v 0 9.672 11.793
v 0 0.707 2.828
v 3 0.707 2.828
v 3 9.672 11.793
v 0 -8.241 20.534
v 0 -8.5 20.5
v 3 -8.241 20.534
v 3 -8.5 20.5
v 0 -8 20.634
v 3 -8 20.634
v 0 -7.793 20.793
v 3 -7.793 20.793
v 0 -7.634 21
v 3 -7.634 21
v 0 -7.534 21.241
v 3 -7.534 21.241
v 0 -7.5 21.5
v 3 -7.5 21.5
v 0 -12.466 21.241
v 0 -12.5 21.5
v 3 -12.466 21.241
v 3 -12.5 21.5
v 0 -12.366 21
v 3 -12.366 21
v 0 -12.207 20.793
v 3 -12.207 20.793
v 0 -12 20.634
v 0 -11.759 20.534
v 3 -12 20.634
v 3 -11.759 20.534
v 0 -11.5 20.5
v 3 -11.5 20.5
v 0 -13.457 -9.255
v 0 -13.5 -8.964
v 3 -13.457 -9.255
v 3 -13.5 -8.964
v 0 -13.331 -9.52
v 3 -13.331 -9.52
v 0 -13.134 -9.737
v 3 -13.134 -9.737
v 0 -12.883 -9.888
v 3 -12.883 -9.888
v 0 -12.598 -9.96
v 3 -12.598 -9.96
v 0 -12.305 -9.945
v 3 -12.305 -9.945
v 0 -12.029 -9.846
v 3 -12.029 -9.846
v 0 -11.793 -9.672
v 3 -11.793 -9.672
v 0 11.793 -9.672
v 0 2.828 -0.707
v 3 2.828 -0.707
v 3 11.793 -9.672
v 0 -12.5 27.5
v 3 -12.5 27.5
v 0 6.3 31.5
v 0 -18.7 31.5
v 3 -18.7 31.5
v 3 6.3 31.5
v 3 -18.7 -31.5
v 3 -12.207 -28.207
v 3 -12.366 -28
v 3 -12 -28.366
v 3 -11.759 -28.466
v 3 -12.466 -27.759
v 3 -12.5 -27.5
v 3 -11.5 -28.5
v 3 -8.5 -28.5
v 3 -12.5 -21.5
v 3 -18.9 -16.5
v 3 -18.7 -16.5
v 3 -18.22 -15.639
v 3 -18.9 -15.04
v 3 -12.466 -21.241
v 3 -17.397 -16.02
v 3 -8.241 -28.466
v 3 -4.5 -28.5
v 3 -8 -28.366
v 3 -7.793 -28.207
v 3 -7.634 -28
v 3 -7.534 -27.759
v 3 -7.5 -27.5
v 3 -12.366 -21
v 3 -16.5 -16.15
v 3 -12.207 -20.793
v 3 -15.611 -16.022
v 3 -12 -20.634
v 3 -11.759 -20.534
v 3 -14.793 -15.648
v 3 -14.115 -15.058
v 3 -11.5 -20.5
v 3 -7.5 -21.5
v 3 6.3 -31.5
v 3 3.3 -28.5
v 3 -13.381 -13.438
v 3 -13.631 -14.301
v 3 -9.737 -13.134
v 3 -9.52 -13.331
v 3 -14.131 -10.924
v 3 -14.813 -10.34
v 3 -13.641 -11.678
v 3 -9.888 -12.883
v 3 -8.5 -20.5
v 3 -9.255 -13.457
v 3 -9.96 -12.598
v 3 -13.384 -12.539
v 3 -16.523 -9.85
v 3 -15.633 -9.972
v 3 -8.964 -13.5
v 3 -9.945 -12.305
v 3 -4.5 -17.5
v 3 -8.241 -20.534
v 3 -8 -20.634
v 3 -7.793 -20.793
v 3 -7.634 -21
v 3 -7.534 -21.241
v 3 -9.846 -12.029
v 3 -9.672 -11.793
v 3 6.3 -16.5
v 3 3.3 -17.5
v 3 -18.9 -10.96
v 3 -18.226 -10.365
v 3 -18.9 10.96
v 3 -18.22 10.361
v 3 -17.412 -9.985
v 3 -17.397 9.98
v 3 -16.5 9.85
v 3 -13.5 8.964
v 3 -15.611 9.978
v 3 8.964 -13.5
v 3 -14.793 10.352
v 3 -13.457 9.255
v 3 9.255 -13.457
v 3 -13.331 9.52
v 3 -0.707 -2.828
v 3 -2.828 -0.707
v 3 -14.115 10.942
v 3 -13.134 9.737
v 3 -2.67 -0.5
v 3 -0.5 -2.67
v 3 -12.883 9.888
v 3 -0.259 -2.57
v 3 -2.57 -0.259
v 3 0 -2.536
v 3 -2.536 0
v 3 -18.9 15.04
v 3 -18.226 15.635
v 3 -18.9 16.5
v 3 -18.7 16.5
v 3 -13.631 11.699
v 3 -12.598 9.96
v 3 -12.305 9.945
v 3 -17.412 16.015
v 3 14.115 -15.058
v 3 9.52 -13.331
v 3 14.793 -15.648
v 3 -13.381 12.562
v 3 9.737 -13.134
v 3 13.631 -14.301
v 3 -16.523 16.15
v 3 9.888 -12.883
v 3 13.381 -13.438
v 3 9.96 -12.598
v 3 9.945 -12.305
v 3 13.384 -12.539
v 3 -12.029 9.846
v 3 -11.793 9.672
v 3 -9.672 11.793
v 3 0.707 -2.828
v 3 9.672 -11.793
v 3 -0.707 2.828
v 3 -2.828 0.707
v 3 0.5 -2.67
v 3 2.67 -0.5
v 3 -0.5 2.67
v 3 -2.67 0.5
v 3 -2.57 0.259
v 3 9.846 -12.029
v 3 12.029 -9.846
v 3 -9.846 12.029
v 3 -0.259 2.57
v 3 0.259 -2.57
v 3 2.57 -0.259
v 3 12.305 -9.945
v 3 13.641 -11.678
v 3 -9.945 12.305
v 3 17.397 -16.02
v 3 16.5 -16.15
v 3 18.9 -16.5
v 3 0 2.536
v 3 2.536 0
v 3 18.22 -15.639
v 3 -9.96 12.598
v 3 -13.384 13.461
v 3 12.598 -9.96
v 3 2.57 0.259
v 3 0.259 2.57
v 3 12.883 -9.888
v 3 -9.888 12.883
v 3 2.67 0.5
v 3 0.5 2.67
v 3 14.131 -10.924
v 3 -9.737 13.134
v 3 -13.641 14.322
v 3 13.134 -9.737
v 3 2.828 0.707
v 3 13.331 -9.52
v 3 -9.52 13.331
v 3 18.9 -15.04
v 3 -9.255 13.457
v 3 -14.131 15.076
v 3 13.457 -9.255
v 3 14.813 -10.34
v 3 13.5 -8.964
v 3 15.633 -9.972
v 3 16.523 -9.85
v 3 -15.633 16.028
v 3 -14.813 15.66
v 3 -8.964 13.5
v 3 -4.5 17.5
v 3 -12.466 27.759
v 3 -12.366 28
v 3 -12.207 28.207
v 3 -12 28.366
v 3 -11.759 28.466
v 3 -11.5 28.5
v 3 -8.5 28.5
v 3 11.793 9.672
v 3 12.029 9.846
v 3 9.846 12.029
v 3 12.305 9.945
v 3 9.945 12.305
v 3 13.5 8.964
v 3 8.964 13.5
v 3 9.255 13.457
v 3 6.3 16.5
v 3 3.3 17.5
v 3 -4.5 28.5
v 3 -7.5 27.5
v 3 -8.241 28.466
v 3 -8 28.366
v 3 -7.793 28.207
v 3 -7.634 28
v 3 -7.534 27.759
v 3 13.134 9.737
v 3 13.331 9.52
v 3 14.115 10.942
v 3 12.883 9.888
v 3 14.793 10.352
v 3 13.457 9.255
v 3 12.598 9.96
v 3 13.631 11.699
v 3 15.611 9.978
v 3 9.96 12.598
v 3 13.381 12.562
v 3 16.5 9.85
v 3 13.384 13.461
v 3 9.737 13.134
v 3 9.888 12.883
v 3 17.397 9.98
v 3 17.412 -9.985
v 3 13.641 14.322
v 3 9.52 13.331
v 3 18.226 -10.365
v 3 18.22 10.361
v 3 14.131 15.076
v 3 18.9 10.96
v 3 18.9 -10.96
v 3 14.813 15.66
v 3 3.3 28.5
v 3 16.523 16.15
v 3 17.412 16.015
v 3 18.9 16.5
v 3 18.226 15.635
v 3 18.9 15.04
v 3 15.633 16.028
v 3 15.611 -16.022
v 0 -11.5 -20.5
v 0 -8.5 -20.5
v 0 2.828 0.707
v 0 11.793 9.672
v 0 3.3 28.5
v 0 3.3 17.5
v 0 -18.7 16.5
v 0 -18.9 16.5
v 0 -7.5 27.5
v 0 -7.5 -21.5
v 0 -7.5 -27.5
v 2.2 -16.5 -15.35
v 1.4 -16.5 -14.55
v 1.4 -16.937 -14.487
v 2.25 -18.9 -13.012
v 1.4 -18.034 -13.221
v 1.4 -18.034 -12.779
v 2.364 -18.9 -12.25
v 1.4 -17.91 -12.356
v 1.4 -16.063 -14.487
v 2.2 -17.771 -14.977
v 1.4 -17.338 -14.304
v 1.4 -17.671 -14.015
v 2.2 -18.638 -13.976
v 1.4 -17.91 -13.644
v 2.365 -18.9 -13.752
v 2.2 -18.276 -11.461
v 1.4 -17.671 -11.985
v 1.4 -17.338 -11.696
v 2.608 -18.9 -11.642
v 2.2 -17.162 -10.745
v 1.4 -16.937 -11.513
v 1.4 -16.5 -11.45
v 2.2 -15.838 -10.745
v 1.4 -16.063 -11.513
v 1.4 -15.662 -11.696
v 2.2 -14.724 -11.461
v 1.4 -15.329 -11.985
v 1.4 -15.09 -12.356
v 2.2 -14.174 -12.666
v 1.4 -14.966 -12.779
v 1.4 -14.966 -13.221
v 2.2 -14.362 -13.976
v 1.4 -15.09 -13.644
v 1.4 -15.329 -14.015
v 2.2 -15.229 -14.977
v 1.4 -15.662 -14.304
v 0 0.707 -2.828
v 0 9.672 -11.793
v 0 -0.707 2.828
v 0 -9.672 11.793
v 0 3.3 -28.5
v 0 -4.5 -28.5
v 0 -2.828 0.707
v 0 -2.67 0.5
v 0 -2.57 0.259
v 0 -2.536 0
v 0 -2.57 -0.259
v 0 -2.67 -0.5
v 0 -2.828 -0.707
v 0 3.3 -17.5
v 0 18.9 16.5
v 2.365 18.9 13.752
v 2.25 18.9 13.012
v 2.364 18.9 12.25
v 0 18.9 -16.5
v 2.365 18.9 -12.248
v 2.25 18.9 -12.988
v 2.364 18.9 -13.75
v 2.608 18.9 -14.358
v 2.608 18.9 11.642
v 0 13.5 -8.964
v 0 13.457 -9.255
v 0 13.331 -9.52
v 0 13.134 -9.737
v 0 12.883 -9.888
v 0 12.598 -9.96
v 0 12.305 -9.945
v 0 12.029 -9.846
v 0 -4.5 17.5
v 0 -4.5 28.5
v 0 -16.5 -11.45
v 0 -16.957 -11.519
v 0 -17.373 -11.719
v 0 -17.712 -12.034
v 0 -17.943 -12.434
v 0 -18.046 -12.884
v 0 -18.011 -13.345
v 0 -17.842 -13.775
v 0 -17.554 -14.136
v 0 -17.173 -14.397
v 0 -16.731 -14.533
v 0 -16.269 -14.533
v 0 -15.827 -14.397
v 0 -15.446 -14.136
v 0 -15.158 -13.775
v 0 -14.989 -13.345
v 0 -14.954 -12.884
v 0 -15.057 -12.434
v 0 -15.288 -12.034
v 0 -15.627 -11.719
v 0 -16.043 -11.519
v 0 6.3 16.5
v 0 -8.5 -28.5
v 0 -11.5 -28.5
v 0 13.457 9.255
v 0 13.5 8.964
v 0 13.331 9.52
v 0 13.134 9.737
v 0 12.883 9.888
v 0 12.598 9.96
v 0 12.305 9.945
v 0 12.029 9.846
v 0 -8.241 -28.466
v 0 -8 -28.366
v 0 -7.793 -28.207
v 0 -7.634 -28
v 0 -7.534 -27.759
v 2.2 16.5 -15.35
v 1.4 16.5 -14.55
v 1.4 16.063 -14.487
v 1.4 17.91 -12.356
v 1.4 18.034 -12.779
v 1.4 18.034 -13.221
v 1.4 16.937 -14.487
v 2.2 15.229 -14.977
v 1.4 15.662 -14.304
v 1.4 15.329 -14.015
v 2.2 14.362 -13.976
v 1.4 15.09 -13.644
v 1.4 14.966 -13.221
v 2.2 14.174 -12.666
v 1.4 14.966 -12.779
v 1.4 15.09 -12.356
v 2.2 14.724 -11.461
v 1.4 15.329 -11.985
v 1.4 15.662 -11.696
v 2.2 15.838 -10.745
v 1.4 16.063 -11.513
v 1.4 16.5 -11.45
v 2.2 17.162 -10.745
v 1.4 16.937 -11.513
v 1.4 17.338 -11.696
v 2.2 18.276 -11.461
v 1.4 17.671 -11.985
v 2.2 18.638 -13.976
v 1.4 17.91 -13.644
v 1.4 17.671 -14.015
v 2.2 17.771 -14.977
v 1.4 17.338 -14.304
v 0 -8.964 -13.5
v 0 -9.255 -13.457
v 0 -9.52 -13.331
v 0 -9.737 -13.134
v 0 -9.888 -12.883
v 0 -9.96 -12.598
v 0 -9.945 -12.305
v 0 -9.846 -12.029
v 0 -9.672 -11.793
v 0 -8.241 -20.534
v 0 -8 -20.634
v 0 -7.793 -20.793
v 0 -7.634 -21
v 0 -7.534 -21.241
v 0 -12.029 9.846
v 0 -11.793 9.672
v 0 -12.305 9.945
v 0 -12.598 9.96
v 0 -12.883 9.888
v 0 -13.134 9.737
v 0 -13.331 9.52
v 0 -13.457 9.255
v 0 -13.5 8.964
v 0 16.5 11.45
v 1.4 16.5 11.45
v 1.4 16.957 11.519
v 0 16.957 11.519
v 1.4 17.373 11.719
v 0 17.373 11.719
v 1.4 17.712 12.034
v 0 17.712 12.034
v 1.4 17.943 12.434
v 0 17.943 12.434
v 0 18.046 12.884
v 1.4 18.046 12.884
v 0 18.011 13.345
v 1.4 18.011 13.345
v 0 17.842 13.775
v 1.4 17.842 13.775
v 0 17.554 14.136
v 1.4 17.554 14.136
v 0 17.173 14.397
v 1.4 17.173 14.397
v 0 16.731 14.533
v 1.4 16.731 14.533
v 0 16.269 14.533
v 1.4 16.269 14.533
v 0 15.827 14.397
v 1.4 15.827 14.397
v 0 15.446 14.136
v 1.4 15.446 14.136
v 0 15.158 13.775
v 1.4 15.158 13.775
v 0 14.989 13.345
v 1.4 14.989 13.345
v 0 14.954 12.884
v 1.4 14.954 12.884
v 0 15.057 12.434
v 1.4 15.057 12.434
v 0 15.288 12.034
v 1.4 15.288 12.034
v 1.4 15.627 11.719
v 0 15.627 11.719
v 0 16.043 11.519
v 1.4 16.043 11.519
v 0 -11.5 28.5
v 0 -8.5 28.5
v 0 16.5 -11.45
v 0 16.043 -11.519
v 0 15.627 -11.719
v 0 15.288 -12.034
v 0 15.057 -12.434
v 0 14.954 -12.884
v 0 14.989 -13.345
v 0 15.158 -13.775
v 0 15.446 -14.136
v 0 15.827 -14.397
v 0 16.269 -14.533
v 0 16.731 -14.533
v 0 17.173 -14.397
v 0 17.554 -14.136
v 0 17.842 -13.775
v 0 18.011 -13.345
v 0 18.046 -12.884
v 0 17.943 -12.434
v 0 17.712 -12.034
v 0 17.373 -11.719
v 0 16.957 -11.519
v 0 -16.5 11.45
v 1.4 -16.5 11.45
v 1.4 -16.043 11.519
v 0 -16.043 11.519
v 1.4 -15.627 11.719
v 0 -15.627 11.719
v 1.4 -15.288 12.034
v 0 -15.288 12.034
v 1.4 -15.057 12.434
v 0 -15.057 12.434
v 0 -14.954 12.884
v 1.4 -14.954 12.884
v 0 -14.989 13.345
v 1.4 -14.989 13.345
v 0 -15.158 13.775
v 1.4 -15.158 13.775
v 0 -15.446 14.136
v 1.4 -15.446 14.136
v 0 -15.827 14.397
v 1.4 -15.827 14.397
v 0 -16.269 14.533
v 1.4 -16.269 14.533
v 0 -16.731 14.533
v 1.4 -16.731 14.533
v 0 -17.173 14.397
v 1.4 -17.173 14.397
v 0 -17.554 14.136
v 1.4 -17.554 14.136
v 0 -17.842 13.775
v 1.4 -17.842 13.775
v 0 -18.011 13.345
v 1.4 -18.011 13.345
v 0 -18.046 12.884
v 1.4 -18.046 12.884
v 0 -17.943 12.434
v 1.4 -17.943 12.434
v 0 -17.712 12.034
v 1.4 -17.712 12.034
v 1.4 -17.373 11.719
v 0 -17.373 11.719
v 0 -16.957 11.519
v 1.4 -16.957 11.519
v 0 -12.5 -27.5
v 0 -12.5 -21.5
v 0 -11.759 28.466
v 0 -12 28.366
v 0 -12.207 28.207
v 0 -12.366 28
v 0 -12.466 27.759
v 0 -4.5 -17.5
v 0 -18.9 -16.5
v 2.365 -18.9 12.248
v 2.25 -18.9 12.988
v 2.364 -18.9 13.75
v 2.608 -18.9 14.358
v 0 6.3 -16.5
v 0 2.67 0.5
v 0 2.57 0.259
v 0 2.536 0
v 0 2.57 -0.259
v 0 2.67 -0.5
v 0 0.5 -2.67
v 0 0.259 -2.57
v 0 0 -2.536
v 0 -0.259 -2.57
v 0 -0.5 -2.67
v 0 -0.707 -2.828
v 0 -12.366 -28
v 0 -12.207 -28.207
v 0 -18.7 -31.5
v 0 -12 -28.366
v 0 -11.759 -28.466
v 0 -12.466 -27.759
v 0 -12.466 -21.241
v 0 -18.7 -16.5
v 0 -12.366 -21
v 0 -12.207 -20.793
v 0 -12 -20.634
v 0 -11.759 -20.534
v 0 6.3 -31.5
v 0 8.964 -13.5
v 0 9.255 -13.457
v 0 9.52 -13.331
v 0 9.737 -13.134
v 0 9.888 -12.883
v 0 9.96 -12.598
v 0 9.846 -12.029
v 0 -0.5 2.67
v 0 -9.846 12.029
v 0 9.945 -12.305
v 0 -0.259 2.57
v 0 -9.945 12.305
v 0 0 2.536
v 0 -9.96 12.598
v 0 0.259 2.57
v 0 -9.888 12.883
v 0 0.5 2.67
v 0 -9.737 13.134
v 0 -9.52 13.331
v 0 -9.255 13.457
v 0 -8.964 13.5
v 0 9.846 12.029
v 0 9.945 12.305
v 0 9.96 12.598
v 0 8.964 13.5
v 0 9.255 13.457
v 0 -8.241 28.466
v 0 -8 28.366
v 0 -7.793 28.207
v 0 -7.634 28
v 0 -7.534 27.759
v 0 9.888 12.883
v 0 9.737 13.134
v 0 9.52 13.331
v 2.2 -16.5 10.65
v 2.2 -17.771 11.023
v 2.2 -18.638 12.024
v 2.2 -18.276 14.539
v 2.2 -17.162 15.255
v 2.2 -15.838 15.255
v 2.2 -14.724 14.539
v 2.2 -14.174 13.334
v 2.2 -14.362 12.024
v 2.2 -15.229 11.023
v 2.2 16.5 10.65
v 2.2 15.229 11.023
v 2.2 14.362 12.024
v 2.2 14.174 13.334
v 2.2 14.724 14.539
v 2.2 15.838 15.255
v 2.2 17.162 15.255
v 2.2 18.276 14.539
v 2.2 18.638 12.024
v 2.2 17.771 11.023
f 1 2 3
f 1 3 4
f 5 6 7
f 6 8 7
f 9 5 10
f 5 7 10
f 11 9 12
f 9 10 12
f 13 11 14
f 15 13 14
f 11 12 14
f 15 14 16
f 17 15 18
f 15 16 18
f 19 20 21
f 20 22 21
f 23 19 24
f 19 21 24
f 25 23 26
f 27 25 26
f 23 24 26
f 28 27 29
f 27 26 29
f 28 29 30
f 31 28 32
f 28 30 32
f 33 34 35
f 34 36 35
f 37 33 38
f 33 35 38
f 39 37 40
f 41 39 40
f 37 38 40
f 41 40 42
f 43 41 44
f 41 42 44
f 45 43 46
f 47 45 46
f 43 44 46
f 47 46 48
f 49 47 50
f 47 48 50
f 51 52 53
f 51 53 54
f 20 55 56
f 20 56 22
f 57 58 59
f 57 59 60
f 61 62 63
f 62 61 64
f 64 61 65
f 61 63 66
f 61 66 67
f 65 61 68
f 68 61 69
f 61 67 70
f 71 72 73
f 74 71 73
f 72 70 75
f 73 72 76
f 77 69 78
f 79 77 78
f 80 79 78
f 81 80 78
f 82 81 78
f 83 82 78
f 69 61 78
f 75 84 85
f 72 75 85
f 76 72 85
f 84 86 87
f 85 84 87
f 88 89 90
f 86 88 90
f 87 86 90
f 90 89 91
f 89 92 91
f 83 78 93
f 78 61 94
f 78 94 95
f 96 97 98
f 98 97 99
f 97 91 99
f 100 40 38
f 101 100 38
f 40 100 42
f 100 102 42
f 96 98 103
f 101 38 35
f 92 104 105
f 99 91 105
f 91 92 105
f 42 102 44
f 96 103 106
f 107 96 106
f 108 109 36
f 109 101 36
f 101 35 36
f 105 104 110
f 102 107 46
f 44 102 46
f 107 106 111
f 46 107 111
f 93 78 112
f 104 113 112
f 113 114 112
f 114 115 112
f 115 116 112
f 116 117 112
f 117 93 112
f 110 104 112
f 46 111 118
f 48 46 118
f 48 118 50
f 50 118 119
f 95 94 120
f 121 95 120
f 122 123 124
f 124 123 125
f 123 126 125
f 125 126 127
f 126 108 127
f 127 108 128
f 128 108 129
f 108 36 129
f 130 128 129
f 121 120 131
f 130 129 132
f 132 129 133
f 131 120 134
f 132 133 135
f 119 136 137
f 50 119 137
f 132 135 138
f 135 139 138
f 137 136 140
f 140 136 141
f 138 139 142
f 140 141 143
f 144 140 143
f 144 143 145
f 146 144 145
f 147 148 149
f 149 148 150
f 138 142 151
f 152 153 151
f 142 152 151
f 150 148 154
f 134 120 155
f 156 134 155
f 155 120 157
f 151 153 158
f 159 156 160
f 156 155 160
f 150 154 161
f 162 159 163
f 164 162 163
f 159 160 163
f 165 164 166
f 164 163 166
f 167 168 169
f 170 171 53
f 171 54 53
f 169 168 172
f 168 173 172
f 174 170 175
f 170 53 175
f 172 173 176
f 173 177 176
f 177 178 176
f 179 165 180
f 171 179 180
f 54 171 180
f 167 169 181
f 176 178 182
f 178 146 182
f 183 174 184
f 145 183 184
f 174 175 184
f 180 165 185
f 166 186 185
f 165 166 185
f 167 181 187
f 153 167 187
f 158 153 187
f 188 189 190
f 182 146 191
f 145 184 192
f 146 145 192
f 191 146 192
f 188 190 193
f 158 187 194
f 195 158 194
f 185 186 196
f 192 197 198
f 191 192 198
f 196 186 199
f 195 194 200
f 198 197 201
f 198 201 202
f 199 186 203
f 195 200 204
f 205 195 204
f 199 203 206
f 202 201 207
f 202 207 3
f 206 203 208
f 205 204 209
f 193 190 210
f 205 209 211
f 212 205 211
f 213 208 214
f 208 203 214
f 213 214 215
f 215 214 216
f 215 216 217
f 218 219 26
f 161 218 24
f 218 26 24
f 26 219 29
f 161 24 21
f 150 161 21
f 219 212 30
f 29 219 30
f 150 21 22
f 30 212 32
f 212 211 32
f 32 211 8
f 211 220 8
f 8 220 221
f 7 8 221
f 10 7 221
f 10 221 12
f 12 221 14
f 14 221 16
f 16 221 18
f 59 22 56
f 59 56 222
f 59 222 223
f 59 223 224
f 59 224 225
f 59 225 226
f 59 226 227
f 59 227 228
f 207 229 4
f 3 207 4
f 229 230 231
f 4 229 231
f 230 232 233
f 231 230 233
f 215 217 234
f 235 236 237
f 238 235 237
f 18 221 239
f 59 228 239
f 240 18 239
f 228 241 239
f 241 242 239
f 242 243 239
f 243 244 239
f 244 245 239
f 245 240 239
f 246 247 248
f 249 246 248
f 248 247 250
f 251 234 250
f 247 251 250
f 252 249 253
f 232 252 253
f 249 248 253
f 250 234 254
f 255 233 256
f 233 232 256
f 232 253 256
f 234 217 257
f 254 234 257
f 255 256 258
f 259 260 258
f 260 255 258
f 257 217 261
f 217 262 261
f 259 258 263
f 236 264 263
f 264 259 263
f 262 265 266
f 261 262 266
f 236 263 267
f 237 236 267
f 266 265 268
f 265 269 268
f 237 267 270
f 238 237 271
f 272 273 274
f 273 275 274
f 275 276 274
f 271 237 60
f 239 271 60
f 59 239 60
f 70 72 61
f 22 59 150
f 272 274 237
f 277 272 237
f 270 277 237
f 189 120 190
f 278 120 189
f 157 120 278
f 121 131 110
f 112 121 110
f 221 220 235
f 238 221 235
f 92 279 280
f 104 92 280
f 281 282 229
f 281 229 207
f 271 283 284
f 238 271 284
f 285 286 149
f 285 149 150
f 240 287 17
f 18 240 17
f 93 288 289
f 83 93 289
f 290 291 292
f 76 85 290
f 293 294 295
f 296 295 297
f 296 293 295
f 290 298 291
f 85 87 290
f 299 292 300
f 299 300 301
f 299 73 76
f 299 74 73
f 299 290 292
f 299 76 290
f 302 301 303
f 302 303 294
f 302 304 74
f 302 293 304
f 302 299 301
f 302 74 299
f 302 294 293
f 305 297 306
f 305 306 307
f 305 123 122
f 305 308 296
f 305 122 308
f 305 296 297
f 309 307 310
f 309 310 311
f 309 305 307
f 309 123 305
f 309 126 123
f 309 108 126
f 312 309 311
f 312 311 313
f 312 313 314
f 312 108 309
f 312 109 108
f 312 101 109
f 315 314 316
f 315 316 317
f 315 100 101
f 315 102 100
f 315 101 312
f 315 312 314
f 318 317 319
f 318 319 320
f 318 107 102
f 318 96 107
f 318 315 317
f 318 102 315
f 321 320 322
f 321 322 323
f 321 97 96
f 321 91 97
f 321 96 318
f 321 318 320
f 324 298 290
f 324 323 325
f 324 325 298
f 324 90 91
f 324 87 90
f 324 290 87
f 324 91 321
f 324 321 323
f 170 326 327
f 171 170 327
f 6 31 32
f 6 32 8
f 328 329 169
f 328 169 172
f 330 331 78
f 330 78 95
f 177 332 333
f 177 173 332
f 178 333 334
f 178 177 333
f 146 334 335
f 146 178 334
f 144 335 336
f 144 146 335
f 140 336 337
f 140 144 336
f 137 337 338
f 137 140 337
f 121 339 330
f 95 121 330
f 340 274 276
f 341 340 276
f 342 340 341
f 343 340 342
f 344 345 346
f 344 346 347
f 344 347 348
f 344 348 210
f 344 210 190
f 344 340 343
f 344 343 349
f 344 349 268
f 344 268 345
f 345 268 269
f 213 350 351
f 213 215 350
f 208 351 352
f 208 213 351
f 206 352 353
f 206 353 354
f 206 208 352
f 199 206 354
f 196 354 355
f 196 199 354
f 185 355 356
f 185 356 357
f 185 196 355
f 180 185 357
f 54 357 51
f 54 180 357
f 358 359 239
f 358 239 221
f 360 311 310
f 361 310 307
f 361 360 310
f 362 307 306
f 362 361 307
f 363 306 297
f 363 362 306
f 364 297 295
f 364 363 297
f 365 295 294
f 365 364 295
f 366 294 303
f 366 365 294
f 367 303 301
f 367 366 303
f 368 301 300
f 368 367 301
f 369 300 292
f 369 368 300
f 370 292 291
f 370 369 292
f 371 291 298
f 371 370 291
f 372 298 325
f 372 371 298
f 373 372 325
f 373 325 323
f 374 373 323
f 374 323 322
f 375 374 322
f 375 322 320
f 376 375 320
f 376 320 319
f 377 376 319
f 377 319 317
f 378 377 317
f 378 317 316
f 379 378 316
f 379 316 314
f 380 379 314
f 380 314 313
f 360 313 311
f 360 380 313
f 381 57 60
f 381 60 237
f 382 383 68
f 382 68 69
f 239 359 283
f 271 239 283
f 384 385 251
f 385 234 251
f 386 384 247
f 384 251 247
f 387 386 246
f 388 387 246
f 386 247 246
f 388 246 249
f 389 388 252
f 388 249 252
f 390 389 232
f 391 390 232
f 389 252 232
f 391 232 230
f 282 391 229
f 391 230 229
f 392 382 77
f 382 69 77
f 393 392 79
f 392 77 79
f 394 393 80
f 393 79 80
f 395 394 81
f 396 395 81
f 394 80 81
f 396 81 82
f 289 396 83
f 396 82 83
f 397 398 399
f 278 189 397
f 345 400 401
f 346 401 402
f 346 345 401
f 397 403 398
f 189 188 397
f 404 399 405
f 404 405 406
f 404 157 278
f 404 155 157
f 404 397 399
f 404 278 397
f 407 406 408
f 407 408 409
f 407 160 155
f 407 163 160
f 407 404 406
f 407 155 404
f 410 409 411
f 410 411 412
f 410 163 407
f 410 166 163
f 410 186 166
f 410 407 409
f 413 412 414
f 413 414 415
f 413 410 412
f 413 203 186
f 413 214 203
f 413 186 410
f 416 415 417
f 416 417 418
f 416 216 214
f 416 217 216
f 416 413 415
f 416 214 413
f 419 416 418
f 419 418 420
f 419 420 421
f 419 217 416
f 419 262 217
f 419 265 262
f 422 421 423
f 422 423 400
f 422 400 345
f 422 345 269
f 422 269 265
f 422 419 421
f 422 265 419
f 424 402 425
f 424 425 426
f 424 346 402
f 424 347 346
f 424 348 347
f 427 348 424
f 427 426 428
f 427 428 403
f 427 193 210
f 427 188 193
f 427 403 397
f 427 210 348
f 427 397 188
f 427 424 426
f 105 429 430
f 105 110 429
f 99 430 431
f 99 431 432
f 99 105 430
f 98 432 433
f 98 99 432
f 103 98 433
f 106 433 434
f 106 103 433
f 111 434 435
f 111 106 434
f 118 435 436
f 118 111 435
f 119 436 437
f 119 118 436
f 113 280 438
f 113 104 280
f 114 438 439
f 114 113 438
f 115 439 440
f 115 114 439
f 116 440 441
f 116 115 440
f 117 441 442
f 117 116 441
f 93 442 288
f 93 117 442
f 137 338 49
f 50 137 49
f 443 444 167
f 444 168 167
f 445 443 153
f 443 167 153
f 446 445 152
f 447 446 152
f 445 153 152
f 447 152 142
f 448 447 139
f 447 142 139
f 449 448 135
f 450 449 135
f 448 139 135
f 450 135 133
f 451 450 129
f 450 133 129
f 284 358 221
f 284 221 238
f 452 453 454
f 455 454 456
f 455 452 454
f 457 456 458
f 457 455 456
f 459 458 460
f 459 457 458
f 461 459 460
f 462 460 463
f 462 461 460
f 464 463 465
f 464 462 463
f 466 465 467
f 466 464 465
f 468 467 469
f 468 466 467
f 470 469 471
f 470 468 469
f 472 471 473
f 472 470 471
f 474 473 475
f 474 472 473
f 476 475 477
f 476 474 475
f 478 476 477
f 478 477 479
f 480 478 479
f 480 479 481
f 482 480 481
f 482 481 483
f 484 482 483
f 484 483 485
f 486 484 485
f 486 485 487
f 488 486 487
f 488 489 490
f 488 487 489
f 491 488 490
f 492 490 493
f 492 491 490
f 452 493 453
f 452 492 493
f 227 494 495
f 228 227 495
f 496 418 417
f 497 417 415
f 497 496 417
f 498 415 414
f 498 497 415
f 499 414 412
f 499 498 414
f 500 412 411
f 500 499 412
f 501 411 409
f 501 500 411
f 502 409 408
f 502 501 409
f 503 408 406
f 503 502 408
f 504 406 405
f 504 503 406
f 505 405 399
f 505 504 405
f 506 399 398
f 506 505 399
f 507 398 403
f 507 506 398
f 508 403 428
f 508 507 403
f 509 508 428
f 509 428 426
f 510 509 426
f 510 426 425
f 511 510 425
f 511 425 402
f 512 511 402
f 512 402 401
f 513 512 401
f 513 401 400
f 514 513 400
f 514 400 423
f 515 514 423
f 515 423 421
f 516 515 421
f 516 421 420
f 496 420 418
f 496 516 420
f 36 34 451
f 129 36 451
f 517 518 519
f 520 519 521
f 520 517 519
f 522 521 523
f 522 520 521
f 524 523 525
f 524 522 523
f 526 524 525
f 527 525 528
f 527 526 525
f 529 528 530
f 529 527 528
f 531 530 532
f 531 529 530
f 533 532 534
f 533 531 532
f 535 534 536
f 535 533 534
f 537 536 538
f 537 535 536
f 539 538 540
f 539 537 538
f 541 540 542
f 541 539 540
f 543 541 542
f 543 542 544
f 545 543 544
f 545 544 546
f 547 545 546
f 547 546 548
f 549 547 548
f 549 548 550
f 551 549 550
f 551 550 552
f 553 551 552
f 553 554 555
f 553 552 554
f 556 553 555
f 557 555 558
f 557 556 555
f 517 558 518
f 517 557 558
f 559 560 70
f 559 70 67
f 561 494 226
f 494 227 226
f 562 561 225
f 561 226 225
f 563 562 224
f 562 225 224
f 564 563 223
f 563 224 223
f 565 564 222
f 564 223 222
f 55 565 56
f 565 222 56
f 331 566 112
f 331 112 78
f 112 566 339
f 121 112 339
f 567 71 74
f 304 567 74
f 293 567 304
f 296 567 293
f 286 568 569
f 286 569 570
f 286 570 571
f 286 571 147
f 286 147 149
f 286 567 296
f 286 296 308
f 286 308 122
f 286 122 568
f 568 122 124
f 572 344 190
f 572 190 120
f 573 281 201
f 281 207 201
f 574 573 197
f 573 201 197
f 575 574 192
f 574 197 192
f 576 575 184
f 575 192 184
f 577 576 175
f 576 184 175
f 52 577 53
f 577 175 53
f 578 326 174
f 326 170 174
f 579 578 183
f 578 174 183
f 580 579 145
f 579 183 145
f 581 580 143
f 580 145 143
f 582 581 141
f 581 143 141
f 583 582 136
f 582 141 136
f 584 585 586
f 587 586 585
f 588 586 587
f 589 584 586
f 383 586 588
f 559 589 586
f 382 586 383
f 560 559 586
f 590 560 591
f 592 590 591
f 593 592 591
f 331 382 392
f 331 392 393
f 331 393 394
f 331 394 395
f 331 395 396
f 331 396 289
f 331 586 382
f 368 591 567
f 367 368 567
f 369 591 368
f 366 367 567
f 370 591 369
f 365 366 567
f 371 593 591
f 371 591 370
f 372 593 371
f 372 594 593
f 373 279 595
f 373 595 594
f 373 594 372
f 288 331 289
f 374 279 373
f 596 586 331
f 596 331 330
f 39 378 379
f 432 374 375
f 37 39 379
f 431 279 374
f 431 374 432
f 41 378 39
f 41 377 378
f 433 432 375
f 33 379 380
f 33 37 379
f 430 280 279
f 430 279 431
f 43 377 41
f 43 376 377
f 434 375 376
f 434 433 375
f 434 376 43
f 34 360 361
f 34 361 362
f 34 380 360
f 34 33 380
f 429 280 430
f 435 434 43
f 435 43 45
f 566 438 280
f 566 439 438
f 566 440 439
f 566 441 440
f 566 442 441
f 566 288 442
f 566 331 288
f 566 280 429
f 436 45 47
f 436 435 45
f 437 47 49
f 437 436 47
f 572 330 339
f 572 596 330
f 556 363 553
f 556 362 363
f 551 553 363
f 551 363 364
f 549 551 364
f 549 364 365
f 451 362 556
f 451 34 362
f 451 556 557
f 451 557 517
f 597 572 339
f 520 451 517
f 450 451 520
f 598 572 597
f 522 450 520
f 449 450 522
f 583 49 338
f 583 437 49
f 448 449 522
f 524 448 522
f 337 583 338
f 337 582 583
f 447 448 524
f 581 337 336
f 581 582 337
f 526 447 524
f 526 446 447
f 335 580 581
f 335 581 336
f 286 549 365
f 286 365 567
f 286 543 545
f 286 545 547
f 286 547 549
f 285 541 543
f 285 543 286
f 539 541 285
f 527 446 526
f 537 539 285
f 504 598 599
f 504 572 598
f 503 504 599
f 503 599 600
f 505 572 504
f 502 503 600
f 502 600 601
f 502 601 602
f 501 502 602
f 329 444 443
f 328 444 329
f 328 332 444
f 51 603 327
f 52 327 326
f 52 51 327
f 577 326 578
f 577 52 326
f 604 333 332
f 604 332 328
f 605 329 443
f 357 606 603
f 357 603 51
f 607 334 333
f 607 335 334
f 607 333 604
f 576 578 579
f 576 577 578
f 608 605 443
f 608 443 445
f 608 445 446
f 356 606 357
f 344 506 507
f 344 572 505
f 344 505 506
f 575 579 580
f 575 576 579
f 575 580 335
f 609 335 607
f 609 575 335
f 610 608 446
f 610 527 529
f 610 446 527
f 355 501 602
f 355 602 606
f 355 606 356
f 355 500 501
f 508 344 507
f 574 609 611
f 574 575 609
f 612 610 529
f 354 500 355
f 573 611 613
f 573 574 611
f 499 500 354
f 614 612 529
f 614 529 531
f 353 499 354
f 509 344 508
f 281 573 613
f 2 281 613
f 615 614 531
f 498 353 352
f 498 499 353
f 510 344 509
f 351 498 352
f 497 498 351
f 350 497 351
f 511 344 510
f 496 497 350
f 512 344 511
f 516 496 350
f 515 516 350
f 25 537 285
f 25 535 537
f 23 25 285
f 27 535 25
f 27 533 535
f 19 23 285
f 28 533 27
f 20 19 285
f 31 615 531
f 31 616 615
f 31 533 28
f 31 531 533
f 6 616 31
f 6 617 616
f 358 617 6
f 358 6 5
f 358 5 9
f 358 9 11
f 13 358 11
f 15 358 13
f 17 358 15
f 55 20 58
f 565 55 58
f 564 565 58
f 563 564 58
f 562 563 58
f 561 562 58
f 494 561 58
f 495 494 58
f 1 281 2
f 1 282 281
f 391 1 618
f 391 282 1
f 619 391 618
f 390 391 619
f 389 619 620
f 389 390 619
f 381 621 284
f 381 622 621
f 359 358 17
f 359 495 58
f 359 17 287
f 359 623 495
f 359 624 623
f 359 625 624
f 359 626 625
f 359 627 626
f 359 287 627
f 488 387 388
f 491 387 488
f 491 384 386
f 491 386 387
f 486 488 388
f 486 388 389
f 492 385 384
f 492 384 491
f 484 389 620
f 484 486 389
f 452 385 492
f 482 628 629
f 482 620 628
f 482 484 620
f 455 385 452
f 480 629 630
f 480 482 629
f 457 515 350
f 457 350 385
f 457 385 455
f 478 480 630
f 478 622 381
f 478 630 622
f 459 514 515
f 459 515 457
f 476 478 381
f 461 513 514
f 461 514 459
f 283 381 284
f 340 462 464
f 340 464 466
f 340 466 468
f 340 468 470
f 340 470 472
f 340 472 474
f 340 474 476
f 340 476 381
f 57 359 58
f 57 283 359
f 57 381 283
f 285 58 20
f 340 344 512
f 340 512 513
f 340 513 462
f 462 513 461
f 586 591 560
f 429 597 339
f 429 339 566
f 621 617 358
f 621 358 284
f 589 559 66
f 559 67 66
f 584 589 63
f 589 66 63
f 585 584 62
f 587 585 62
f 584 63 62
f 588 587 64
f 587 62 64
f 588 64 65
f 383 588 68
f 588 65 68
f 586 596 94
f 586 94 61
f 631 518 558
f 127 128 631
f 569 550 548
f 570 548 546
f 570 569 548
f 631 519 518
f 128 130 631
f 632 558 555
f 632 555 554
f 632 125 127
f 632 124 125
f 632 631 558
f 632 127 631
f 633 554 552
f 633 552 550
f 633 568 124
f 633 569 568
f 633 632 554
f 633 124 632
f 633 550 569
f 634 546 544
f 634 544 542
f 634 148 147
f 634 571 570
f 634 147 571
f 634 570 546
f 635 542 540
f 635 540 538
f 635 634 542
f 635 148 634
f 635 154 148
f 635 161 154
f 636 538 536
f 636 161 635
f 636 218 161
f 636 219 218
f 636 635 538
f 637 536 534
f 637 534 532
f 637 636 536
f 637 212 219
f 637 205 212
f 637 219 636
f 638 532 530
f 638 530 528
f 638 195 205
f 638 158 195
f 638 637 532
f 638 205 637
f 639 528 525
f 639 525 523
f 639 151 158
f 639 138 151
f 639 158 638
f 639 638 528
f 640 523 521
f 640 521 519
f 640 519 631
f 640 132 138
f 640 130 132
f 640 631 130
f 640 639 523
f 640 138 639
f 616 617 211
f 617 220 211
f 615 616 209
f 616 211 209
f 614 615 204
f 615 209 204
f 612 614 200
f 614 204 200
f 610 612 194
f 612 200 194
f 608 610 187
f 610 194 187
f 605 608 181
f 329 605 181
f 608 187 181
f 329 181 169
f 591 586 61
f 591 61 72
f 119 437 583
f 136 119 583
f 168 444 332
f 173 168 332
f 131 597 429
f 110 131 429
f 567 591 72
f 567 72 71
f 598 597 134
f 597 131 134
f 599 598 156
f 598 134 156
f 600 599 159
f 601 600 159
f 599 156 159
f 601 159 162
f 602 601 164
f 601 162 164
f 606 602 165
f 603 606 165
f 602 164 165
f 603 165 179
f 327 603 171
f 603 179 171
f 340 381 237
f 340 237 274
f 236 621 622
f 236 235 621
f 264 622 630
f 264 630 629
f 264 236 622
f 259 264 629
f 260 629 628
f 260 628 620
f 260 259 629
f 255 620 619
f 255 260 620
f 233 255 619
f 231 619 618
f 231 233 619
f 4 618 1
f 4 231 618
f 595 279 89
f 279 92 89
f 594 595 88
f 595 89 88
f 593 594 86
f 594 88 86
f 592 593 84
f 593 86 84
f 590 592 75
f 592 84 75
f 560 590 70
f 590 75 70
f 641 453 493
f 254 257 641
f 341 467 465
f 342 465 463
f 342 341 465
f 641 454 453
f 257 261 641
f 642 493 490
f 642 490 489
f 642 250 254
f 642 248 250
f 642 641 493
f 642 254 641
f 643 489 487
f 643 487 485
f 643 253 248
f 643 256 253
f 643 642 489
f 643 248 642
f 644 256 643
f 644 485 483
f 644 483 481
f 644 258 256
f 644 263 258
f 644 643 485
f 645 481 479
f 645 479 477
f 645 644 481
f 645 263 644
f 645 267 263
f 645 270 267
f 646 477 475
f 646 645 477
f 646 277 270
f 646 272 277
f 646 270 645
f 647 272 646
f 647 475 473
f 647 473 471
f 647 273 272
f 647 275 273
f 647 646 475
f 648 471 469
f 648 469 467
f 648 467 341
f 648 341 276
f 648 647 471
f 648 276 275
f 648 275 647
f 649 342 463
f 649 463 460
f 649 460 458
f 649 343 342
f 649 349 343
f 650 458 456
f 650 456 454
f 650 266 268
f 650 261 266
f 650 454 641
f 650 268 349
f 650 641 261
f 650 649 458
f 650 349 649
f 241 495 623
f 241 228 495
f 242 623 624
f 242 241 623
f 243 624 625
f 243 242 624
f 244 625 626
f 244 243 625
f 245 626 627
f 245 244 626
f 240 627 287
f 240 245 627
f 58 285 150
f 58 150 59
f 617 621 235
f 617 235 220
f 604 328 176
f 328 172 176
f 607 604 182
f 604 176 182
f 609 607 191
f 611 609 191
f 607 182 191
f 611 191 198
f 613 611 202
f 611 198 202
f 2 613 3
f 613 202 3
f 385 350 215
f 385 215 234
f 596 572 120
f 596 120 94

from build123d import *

# Parameters (mm, degrees)
SKETCH_1_R                  = 1.55
SKETCH_1_W                  = 8
SKETCH_1_H                  = 5
SKETCH_1_W_2                = 11
SKETCH_1_H_2                = 7.8
EXTRUDE_1_DEPTH             = 3
HOLE_WIZARD_M3_1_AT_2_COUNT = 2
HOLE_WIZARD_M3_1_AT_2_PITCH = 26
HOLE_WIZARD_M3_1_AT_3_COUNT = 2
HOLE_WIZARD_M3_1_AT_3_PITCH = 42.011903075
HOLE_WIZARD_M3_1_AT_4_COUNT = 2
HOLE_WIZARD_M3_1_AT_4_PITCH = 33
FILLET_1_R                  = 1


with BuildPart() as part:
    # 草图1 → 凸台-拉伸1 (new body)
    with BuildSketch(Plane(origin=(0, 0, 0), x_dir=(0, 0, -1), z_dir=(1, 0, 0))):
        Polygon((16.5, -18.9), (-16.5, -18.9), (-16.5, -18.7), (-31.5, -18.7), (-31.5, 6.3), (-16.5, 6.3), (-16.5, 18.9), (16.5, 18.9), (16.5, 6.3), (31.5, 6.3), (31.5, -18.7), (16.5, -18.7), align=None)
        with Locations((-13, 16.5)):
            Circle(SKETCH_1_R, mode=Mode.SUBTRACT)
        with Locations((-13, -16.5)):
            Circle(SKETCH_1_R, mode=Mode.SUBTRACT)
        with Locations(Location((13, -16.5, 0), (0, 0, 180))):
            Circle(SKETCH_1_R, mode=Mode.SUBTRACT)
        with Locations(Location((13, 16.5, 0), (0, 0, 180))):
            Circle(SKETCH_1_R, mode=Mode.SUBTRACT)
        with Locations((24.5, -10)):
            Rectangle(SKETCH_1_W, SKETCH_1_H, mode=Mode.SUBTRACT)
        with Locations((-24.5, -10)):
            Rectangle(SKETCH_1_W, SKETCH_1_H, mode=Mode.SUBTRACT)
        Polygon((-13.5, -11.378679656), (-2.121320344, 0), (-13.5, 11.378679656), align=None, mode=Mode.SUBTRACT)
        Polygon((-11.378679656, -13.5), (0, -2.121320344), (11.378679656, -13.5), align=None, mode=Mode.SUBTRACT)
        Polygon((-11.378679656, 13.5), (0, 2.121320344), (11.378679656, 13.5), align=None, mode=Mode.SUBTRACT)
        Polygon((13.5, 11.378679656), (13.5, -11.378679656), (2.121320344, 0), align=None, mode=Mode.SUBTRACT)
        with Locations((23, -0.6)):
            Rectangle(SKETCH_1_W_2, SKETCH_1_H_2, mode=Mode.SUBTRACT)
        with Locations((-23, -0.6)):
            Rectangle(SKETCH_1_W_2, SKETCH_1_H_2, mode=Mode.SUBTRACT)
    extrude(amount=EXTRUDE_1_DEPTH)

    # 草图2 → M3 锥坑高头螺钉的锥形沉头孔1 (revolve, cut)
    with BuildSketch(Plane(origin=(3, 16.5, 13), x_dir=(0, 0, -1), z_dir=(0, 1, 0))):
        Polygon((0, 0), (0, 3), (1.55, 3), (1.55, 1.6), (3.15, 0), align=None)
    hole_wizard_m3_1 = revolve(axis=Axis((9.35, 16.5, 13), (-1, 0, 0)), mode=Mode.SUBTRACT)

    # M3 锥坑高头螺钉的锥形沉头孔1 at 2: M3 锥坑高头螺钉的锥形沉头孔1 ×2
    with Locations(*[(0, 0, -i * HOLE_WIZARD_M3_1_AT_2_PITCH) for i in range(1, HOLE_WIZARD_M3_1_AT_2_COUNT)]):
        add(hole_wizard_m3_1, mode=Mode.SUBTRACT)

    # M3 锥坑高头螺钉的锥形沉头孔1 at 3: M3 锥坑高头螺钉的锥形沉头孔1 ×2
    with Locations(*[Vector(0, -0.7854916722275357, -0.6188722266035129) * (i * HOLE_WIZARD_M3_1_AT_3_PITCH) for i in range(1, HOLE_WIZARD_M3_1_AT_3_COUNT)]):
        add(hole_wizard_m3_1, mode=Mode.SUBTRACT)

    # M3 锥坑高头螺钉的锥形沉头孔1 at 4: M3 锥坑高头螺钉的锥形沉头孔1 ×2
    with Locations(*[(0, -i * HOLE_WIZARD_M3_1_AT_4_PITCH, 0) for i in range(1, HOLE_WIZARD_M3_1_AT_4_COUNT)]):
        add(hole_wizard_m3_1, mode=Mode.SUBTRACT)

    # 圆角1
    fillet_1_edges = [part.edges().sort_by_distance(p)[0] for p in [
        (1.5, 11.378679656, -13.5),
        (1.5, 0, -2.121320344),
        (1.5, -11.378679656, -13.5),
        (1.5, -12.5, 20.5),
        (1.5, -7.5, 20.5),
        (1.5, -7.5, 28.5),
        (1.5, -12.5, 28.5),
        (1.5, -12.5, -28.5),
        (1.5, -7.5, -28.5),
        (1.5, -7.5, -20.5),
        (1.5, -12.5, -20.5),
        (1.5, 11.378679656, 13.5),
        (1.5, -11.378679656, 13.5),
        (1.5, 0, 2.121320344),
        (1.5, 2.121320344, 0),
        (1.5, 13.5, -11.378679656),
        (1.5, 13.5, 11.378679656),
        (1.5, -13.5, 11.378679656),
        (1.5, -13.5, -11.378679656),
        (1.5, -2.121320344, 0),
    ]]
    fillet(fillet_1_edges, radius=FILLET_1_R)


solid = part.part
